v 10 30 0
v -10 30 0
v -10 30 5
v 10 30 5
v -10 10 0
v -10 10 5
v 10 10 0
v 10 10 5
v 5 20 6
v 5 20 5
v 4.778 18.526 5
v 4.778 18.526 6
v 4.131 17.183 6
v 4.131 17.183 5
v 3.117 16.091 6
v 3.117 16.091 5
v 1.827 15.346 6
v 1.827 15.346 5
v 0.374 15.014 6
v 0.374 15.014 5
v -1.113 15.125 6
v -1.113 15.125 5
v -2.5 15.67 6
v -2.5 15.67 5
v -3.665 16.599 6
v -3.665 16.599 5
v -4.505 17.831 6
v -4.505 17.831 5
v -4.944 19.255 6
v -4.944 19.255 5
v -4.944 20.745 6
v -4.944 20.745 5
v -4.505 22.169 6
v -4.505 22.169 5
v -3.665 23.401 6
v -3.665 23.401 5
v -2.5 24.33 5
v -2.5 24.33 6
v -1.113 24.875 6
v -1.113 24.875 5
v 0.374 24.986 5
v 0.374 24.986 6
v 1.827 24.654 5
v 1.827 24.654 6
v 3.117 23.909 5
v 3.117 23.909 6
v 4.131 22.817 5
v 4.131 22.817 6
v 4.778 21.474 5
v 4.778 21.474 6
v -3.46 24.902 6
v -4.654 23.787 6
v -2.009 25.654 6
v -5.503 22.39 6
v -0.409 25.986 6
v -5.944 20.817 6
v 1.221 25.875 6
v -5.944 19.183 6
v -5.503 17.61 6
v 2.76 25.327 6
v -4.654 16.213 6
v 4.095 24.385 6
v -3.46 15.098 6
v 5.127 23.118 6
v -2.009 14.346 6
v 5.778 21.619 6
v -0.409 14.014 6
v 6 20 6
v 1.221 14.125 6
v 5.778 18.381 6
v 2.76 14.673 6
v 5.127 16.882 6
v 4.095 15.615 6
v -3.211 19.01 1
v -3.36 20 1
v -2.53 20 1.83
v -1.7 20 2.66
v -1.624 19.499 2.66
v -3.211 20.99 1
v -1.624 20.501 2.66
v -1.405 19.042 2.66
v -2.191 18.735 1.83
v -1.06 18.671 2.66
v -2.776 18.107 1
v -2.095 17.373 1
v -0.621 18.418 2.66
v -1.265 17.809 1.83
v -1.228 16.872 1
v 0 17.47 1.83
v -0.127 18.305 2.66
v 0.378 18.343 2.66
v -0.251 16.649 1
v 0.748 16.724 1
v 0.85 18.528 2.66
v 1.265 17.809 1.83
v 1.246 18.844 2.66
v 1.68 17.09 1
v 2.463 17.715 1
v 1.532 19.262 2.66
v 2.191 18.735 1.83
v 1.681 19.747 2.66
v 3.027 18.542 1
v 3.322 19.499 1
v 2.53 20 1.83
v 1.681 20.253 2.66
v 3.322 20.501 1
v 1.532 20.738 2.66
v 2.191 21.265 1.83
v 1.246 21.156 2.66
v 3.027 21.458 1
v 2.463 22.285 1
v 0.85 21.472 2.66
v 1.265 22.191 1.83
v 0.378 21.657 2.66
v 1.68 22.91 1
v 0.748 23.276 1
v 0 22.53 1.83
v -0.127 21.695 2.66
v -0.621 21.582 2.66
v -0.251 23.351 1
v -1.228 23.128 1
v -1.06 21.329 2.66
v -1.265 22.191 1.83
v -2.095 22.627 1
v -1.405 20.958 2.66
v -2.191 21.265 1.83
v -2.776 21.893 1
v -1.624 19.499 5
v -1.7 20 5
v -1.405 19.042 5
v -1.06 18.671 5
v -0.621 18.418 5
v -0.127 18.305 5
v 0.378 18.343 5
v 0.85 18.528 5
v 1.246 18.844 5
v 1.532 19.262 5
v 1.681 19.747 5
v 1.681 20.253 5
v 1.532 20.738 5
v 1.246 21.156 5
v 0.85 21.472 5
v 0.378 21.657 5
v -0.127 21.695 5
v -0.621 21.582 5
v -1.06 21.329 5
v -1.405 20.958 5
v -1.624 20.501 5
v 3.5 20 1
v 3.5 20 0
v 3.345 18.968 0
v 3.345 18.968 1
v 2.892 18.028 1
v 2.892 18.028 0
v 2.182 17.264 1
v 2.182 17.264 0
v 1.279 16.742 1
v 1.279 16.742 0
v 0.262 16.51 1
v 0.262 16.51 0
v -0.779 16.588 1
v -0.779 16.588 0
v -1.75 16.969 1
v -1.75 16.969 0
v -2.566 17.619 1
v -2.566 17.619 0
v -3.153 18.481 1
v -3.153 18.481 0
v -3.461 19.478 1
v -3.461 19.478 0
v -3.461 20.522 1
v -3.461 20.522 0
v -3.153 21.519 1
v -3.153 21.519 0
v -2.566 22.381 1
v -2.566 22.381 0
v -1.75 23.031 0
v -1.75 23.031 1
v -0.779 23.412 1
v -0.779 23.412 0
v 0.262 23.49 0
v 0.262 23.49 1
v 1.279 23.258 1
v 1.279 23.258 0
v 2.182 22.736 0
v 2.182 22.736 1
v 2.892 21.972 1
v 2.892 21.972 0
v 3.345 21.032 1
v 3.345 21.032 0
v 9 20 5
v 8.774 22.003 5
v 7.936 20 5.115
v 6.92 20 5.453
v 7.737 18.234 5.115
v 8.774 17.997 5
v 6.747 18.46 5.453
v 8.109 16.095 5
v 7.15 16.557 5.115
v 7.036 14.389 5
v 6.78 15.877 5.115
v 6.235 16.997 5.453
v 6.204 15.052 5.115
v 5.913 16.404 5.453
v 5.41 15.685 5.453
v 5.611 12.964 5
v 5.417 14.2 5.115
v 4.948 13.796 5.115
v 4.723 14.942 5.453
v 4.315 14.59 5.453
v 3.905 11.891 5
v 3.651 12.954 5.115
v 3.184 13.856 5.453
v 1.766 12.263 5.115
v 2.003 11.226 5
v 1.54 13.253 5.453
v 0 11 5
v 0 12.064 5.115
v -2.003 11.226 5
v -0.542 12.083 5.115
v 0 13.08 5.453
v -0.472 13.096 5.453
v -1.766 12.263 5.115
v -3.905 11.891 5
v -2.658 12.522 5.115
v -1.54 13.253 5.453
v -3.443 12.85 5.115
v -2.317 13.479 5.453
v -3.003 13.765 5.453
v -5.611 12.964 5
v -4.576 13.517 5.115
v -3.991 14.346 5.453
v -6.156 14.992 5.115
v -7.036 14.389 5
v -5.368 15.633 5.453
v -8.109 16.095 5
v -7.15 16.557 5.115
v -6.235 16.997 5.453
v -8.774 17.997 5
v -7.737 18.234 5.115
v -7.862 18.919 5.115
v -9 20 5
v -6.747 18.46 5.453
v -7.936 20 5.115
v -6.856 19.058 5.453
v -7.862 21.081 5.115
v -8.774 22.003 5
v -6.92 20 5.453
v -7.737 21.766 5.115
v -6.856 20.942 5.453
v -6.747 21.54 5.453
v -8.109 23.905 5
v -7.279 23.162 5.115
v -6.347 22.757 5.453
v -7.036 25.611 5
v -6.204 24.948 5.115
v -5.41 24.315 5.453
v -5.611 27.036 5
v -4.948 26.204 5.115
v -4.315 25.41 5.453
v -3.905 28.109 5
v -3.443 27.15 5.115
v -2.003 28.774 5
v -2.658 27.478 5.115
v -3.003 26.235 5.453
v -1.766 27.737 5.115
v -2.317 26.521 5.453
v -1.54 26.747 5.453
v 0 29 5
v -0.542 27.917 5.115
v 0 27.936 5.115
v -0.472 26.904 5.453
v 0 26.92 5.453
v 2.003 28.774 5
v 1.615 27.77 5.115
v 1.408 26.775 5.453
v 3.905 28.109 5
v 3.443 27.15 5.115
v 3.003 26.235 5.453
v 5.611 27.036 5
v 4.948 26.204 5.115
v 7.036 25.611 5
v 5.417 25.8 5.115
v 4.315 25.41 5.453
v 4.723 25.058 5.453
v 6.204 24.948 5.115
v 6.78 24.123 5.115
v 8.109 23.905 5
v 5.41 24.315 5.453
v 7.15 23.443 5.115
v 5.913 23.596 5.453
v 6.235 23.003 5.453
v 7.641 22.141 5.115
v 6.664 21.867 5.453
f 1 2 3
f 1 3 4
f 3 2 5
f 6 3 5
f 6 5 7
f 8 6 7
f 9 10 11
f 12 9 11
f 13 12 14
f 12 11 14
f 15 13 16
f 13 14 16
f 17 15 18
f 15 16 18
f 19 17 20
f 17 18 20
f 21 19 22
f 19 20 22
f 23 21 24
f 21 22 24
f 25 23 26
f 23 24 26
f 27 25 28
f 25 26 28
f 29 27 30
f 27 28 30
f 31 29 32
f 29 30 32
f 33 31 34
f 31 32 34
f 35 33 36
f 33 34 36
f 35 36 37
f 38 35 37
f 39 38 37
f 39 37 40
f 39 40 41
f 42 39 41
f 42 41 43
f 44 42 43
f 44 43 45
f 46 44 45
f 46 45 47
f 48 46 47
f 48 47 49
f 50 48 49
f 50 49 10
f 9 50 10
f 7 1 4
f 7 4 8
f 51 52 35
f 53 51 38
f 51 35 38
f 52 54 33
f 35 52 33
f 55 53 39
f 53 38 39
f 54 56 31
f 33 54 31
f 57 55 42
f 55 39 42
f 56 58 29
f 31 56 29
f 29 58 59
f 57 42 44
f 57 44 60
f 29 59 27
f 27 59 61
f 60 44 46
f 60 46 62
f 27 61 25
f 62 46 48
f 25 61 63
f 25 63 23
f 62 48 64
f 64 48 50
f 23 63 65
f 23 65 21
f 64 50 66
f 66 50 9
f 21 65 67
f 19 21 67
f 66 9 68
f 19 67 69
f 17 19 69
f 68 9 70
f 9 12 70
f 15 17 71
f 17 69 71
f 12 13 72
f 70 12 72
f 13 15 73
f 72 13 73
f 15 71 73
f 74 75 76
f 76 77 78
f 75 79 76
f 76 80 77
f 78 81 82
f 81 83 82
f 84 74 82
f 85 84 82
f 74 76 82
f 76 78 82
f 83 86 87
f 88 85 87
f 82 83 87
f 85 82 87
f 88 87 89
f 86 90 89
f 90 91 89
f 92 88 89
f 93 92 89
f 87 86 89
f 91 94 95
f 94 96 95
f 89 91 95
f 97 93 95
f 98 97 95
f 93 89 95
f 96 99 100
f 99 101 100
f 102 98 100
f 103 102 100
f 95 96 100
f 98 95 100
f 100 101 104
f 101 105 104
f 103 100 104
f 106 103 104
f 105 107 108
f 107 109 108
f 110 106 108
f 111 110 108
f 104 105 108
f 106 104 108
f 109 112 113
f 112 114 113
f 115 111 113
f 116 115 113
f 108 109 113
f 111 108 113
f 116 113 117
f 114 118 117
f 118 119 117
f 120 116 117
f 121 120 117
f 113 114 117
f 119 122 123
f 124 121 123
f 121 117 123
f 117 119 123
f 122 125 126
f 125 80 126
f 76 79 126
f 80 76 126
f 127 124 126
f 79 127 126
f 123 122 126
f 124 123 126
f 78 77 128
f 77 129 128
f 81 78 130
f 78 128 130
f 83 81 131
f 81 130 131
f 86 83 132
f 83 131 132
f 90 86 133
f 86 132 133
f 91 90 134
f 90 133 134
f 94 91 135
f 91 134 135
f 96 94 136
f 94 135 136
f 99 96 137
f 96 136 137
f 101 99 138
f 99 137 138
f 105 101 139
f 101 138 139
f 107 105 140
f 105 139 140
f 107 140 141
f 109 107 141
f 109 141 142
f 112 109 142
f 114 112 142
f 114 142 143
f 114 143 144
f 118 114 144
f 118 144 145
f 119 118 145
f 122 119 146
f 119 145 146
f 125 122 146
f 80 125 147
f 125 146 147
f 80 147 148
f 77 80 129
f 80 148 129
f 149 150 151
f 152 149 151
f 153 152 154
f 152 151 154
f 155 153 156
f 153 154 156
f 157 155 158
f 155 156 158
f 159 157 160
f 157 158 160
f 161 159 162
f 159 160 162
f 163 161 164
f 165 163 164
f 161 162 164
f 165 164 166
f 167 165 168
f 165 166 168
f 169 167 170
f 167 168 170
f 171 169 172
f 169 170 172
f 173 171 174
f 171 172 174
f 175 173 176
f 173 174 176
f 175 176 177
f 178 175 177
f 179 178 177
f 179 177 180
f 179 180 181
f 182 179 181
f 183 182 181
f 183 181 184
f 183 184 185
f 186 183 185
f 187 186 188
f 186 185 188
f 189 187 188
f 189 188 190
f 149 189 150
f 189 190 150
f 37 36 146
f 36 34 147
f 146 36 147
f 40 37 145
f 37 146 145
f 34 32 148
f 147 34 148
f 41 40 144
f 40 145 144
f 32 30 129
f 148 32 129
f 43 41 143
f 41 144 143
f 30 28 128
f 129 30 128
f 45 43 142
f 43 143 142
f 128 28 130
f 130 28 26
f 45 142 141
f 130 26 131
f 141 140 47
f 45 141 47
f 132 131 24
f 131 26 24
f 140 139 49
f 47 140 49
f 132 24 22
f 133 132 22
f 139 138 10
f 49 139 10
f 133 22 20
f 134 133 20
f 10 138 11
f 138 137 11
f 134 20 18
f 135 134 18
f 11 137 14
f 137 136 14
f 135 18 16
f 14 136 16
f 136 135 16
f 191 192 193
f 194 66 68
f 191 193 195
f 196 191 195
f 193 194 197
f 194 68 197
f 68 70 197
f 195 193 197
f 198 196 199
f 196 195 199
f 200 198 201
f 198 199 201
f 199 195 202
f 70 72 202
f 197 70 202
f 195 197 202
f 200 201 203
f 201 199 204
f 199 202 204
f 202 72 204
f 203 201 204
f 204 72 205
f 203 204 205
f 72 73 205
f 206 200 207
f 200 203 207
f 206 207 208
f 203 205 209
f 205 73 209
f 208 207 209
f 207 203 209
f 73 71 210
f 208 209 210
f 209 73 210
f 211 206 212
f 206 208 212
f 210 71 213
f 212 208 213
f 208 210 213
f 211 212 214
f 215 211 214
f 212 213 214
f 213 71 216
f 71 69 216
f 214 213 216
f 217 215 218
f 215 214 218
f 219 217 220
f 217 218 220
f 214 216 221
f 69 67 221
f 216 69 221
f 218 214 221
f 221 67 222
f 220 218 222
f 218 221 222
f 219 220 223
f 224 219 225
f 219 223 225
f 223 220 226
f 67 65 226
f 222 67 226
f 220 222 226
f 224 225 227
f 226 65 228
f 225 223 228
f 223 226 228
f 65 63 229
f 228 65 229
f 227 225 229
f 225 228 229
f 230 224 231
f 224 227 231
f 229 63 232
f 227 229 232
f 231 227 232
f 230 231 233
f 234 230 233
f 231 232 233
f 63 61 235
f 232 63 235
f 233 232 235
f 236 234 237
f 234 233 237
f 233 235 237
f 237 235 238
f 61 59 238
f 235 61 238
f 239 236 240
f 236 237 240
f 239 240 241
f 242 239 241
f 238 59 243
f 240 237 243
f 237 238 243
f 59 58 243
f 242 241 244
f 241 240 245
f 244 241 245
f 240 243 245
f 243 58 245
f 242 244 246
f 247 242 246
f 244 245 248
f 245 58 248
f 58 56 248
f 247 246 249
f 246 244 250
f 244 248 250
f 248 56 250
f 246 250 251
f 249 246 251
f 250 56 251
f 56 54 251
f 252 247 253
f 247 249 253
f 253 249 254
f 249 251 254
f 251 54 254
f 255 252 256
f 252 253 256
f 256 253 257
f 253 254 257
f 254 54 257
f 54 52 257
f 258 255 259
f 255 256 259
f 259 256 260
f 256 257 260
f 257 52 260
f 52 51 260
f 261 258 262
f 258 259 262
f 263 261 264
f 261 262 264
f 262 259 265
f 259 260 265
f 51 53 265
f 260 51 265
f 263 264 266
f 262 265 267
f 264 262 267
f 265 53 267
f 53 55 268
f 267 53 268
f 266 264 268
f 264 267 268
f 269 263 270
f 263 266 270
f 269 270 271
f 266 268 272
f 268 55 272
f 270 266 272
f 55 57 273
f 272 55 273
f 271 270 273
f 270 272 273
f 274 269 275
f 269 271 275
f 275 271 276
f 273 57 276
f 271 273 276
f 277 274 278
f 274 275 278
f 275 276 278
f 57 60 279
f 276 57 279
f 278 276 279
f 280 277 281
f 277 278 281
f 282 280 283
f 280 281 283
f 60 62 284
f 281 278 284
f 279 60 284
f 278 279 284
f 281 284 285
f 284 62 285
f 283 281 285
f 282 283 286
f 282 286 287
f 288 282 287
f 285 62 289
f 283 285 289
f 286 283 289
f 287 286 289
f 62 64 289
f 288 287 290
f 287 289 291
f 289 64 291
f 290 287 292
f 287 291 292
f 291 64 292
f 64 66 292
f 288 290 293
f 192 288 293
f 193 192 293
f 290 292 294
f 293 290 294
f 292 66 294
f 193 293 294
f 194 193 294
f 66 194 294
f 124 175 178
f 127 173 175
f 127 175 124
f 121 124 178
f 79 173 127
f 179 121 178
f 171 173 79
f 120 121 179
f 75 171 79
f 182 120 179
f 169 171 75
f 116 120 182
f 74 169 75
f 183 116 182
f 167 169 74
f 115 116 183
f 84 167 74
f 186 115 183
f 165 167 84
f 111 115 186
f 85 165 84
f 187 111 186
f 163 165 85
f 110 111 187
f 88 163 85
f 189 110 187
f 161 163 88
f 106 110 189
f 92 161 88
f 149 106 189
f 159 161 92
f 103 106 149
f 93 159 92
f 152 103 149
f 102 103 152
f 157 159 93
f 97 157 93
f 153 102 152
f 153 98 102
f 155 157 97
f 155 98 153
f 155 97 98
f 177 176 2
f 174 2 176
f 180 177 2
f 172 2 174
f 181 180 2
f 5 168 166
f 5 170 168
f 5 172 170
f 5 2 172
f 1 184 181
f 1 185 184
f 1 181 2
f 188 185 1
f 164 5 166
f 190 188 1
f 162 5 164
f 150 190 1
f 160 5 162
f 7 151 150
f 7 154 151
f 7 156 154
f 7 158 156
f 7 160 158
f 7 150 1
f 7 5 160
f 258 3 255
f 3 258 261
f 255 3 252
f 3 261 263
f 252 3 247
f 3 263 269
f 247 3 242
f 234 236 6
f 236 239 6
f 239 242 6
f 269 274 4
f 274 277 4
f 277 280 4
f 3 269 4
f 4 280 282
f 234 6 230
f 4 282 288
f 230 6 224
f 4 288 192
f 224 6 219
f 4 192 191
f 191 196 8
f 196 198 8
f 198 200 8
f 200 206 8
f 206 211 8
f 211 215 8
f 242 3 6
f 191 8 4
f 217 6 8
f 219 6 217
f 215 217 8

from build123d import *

# Parameters (mm, degrees)
F0_W           = 20
F0_H           = 20
F0_R           = 6
F0_R_2         = 5
F0_R_3         = 3.5
F1_DEPTH       = 5
F2_DEPTH       = 6
F3_DEPTH       = 1
F4_D           = 3.4
F4_START       = 1
F4_CSINK_D     = 6.72
F4_CSINK_ANGLE = 90
F6_ANGLE       = 180


# Not quite as in the source:
# - a fillet or chamfer that OpenCascade refuses, or shapes differently, is made with other operations: its cross-section is extruded or revolved along the edge and cut away or added


with BuildPart() as f1:
    # F0 (on Top) → F1 (new body)
    with BuildSketch(Plane.XY):
        Rectangle(F0_W, F0_H)
        Circle(F0_R, mode=Mode.SUBTRACT)
        Circle(F0_R)
        Circle(F0_R_2, mode=Mode.SUBTRACT)
        Circle(F0_R_2)
        Circle(F0_R_3, mode=Mode.SUBTRACT)
        Circle(F0_R_3)
    extrude(amount=-F1_DEPTH)

    # F0 (on Top) → F2 (join)
    with BuildSketch(Plane.XY):
        Circle(F0_R)
        Circle(F0_R_2, mode=Mode.SUBTRACT)
    extrude(amount=-F2_DEPTH)

    # F0 (on Top) → F3 (cut)
    with BuildSketch(Plane.XY):
        Circle(F0_R_3)
    extrude(amount=-F3_DEPTH, mode=Mode.SUBTRACT)

    # F4 (through all)
    # its depths count from where the whole tool has entered the part; down to there all is cleared
    with Locations(Plane.XY.offset(-F4_START)):
        with Locations((0, 0)):
            CounterSinkHole(F4_D / 2, F4_CSINK_D / 2, counter_sink_angle=F4_CSINK_ANGLE)

    # F5: fillet of radius 5 on 1 edges, made by hand

    # F5_s1 → F5_t2 (revolve)
    with BuildSketch(Plane.XZ):
        with BuildLine():
            ThreePointArc((9, -5), (7.4188611699, -5.2565835097), (6, -6))
            Line((6, -6), (5.94, -5.92))
            ThreePointArc((5.94, -5.92), (5.9, -5.5), (5.9, -5))
            Line((5.9, -5), (6, -4.9))
            Line((6, -4.9), (9, -4.9))
            Line((9, -4.9), (9, -5))
        make_face()
    revolve(axis=Axis((0, 0, -5), (0, 0, 1)))


with BuildPart() as f1_1:
    # F6: moved
    add(f1.part.rotate(Axis((0, 10, 0), (-1, 0, 0)), F6_ANGLE))


solid = f1_1.part
